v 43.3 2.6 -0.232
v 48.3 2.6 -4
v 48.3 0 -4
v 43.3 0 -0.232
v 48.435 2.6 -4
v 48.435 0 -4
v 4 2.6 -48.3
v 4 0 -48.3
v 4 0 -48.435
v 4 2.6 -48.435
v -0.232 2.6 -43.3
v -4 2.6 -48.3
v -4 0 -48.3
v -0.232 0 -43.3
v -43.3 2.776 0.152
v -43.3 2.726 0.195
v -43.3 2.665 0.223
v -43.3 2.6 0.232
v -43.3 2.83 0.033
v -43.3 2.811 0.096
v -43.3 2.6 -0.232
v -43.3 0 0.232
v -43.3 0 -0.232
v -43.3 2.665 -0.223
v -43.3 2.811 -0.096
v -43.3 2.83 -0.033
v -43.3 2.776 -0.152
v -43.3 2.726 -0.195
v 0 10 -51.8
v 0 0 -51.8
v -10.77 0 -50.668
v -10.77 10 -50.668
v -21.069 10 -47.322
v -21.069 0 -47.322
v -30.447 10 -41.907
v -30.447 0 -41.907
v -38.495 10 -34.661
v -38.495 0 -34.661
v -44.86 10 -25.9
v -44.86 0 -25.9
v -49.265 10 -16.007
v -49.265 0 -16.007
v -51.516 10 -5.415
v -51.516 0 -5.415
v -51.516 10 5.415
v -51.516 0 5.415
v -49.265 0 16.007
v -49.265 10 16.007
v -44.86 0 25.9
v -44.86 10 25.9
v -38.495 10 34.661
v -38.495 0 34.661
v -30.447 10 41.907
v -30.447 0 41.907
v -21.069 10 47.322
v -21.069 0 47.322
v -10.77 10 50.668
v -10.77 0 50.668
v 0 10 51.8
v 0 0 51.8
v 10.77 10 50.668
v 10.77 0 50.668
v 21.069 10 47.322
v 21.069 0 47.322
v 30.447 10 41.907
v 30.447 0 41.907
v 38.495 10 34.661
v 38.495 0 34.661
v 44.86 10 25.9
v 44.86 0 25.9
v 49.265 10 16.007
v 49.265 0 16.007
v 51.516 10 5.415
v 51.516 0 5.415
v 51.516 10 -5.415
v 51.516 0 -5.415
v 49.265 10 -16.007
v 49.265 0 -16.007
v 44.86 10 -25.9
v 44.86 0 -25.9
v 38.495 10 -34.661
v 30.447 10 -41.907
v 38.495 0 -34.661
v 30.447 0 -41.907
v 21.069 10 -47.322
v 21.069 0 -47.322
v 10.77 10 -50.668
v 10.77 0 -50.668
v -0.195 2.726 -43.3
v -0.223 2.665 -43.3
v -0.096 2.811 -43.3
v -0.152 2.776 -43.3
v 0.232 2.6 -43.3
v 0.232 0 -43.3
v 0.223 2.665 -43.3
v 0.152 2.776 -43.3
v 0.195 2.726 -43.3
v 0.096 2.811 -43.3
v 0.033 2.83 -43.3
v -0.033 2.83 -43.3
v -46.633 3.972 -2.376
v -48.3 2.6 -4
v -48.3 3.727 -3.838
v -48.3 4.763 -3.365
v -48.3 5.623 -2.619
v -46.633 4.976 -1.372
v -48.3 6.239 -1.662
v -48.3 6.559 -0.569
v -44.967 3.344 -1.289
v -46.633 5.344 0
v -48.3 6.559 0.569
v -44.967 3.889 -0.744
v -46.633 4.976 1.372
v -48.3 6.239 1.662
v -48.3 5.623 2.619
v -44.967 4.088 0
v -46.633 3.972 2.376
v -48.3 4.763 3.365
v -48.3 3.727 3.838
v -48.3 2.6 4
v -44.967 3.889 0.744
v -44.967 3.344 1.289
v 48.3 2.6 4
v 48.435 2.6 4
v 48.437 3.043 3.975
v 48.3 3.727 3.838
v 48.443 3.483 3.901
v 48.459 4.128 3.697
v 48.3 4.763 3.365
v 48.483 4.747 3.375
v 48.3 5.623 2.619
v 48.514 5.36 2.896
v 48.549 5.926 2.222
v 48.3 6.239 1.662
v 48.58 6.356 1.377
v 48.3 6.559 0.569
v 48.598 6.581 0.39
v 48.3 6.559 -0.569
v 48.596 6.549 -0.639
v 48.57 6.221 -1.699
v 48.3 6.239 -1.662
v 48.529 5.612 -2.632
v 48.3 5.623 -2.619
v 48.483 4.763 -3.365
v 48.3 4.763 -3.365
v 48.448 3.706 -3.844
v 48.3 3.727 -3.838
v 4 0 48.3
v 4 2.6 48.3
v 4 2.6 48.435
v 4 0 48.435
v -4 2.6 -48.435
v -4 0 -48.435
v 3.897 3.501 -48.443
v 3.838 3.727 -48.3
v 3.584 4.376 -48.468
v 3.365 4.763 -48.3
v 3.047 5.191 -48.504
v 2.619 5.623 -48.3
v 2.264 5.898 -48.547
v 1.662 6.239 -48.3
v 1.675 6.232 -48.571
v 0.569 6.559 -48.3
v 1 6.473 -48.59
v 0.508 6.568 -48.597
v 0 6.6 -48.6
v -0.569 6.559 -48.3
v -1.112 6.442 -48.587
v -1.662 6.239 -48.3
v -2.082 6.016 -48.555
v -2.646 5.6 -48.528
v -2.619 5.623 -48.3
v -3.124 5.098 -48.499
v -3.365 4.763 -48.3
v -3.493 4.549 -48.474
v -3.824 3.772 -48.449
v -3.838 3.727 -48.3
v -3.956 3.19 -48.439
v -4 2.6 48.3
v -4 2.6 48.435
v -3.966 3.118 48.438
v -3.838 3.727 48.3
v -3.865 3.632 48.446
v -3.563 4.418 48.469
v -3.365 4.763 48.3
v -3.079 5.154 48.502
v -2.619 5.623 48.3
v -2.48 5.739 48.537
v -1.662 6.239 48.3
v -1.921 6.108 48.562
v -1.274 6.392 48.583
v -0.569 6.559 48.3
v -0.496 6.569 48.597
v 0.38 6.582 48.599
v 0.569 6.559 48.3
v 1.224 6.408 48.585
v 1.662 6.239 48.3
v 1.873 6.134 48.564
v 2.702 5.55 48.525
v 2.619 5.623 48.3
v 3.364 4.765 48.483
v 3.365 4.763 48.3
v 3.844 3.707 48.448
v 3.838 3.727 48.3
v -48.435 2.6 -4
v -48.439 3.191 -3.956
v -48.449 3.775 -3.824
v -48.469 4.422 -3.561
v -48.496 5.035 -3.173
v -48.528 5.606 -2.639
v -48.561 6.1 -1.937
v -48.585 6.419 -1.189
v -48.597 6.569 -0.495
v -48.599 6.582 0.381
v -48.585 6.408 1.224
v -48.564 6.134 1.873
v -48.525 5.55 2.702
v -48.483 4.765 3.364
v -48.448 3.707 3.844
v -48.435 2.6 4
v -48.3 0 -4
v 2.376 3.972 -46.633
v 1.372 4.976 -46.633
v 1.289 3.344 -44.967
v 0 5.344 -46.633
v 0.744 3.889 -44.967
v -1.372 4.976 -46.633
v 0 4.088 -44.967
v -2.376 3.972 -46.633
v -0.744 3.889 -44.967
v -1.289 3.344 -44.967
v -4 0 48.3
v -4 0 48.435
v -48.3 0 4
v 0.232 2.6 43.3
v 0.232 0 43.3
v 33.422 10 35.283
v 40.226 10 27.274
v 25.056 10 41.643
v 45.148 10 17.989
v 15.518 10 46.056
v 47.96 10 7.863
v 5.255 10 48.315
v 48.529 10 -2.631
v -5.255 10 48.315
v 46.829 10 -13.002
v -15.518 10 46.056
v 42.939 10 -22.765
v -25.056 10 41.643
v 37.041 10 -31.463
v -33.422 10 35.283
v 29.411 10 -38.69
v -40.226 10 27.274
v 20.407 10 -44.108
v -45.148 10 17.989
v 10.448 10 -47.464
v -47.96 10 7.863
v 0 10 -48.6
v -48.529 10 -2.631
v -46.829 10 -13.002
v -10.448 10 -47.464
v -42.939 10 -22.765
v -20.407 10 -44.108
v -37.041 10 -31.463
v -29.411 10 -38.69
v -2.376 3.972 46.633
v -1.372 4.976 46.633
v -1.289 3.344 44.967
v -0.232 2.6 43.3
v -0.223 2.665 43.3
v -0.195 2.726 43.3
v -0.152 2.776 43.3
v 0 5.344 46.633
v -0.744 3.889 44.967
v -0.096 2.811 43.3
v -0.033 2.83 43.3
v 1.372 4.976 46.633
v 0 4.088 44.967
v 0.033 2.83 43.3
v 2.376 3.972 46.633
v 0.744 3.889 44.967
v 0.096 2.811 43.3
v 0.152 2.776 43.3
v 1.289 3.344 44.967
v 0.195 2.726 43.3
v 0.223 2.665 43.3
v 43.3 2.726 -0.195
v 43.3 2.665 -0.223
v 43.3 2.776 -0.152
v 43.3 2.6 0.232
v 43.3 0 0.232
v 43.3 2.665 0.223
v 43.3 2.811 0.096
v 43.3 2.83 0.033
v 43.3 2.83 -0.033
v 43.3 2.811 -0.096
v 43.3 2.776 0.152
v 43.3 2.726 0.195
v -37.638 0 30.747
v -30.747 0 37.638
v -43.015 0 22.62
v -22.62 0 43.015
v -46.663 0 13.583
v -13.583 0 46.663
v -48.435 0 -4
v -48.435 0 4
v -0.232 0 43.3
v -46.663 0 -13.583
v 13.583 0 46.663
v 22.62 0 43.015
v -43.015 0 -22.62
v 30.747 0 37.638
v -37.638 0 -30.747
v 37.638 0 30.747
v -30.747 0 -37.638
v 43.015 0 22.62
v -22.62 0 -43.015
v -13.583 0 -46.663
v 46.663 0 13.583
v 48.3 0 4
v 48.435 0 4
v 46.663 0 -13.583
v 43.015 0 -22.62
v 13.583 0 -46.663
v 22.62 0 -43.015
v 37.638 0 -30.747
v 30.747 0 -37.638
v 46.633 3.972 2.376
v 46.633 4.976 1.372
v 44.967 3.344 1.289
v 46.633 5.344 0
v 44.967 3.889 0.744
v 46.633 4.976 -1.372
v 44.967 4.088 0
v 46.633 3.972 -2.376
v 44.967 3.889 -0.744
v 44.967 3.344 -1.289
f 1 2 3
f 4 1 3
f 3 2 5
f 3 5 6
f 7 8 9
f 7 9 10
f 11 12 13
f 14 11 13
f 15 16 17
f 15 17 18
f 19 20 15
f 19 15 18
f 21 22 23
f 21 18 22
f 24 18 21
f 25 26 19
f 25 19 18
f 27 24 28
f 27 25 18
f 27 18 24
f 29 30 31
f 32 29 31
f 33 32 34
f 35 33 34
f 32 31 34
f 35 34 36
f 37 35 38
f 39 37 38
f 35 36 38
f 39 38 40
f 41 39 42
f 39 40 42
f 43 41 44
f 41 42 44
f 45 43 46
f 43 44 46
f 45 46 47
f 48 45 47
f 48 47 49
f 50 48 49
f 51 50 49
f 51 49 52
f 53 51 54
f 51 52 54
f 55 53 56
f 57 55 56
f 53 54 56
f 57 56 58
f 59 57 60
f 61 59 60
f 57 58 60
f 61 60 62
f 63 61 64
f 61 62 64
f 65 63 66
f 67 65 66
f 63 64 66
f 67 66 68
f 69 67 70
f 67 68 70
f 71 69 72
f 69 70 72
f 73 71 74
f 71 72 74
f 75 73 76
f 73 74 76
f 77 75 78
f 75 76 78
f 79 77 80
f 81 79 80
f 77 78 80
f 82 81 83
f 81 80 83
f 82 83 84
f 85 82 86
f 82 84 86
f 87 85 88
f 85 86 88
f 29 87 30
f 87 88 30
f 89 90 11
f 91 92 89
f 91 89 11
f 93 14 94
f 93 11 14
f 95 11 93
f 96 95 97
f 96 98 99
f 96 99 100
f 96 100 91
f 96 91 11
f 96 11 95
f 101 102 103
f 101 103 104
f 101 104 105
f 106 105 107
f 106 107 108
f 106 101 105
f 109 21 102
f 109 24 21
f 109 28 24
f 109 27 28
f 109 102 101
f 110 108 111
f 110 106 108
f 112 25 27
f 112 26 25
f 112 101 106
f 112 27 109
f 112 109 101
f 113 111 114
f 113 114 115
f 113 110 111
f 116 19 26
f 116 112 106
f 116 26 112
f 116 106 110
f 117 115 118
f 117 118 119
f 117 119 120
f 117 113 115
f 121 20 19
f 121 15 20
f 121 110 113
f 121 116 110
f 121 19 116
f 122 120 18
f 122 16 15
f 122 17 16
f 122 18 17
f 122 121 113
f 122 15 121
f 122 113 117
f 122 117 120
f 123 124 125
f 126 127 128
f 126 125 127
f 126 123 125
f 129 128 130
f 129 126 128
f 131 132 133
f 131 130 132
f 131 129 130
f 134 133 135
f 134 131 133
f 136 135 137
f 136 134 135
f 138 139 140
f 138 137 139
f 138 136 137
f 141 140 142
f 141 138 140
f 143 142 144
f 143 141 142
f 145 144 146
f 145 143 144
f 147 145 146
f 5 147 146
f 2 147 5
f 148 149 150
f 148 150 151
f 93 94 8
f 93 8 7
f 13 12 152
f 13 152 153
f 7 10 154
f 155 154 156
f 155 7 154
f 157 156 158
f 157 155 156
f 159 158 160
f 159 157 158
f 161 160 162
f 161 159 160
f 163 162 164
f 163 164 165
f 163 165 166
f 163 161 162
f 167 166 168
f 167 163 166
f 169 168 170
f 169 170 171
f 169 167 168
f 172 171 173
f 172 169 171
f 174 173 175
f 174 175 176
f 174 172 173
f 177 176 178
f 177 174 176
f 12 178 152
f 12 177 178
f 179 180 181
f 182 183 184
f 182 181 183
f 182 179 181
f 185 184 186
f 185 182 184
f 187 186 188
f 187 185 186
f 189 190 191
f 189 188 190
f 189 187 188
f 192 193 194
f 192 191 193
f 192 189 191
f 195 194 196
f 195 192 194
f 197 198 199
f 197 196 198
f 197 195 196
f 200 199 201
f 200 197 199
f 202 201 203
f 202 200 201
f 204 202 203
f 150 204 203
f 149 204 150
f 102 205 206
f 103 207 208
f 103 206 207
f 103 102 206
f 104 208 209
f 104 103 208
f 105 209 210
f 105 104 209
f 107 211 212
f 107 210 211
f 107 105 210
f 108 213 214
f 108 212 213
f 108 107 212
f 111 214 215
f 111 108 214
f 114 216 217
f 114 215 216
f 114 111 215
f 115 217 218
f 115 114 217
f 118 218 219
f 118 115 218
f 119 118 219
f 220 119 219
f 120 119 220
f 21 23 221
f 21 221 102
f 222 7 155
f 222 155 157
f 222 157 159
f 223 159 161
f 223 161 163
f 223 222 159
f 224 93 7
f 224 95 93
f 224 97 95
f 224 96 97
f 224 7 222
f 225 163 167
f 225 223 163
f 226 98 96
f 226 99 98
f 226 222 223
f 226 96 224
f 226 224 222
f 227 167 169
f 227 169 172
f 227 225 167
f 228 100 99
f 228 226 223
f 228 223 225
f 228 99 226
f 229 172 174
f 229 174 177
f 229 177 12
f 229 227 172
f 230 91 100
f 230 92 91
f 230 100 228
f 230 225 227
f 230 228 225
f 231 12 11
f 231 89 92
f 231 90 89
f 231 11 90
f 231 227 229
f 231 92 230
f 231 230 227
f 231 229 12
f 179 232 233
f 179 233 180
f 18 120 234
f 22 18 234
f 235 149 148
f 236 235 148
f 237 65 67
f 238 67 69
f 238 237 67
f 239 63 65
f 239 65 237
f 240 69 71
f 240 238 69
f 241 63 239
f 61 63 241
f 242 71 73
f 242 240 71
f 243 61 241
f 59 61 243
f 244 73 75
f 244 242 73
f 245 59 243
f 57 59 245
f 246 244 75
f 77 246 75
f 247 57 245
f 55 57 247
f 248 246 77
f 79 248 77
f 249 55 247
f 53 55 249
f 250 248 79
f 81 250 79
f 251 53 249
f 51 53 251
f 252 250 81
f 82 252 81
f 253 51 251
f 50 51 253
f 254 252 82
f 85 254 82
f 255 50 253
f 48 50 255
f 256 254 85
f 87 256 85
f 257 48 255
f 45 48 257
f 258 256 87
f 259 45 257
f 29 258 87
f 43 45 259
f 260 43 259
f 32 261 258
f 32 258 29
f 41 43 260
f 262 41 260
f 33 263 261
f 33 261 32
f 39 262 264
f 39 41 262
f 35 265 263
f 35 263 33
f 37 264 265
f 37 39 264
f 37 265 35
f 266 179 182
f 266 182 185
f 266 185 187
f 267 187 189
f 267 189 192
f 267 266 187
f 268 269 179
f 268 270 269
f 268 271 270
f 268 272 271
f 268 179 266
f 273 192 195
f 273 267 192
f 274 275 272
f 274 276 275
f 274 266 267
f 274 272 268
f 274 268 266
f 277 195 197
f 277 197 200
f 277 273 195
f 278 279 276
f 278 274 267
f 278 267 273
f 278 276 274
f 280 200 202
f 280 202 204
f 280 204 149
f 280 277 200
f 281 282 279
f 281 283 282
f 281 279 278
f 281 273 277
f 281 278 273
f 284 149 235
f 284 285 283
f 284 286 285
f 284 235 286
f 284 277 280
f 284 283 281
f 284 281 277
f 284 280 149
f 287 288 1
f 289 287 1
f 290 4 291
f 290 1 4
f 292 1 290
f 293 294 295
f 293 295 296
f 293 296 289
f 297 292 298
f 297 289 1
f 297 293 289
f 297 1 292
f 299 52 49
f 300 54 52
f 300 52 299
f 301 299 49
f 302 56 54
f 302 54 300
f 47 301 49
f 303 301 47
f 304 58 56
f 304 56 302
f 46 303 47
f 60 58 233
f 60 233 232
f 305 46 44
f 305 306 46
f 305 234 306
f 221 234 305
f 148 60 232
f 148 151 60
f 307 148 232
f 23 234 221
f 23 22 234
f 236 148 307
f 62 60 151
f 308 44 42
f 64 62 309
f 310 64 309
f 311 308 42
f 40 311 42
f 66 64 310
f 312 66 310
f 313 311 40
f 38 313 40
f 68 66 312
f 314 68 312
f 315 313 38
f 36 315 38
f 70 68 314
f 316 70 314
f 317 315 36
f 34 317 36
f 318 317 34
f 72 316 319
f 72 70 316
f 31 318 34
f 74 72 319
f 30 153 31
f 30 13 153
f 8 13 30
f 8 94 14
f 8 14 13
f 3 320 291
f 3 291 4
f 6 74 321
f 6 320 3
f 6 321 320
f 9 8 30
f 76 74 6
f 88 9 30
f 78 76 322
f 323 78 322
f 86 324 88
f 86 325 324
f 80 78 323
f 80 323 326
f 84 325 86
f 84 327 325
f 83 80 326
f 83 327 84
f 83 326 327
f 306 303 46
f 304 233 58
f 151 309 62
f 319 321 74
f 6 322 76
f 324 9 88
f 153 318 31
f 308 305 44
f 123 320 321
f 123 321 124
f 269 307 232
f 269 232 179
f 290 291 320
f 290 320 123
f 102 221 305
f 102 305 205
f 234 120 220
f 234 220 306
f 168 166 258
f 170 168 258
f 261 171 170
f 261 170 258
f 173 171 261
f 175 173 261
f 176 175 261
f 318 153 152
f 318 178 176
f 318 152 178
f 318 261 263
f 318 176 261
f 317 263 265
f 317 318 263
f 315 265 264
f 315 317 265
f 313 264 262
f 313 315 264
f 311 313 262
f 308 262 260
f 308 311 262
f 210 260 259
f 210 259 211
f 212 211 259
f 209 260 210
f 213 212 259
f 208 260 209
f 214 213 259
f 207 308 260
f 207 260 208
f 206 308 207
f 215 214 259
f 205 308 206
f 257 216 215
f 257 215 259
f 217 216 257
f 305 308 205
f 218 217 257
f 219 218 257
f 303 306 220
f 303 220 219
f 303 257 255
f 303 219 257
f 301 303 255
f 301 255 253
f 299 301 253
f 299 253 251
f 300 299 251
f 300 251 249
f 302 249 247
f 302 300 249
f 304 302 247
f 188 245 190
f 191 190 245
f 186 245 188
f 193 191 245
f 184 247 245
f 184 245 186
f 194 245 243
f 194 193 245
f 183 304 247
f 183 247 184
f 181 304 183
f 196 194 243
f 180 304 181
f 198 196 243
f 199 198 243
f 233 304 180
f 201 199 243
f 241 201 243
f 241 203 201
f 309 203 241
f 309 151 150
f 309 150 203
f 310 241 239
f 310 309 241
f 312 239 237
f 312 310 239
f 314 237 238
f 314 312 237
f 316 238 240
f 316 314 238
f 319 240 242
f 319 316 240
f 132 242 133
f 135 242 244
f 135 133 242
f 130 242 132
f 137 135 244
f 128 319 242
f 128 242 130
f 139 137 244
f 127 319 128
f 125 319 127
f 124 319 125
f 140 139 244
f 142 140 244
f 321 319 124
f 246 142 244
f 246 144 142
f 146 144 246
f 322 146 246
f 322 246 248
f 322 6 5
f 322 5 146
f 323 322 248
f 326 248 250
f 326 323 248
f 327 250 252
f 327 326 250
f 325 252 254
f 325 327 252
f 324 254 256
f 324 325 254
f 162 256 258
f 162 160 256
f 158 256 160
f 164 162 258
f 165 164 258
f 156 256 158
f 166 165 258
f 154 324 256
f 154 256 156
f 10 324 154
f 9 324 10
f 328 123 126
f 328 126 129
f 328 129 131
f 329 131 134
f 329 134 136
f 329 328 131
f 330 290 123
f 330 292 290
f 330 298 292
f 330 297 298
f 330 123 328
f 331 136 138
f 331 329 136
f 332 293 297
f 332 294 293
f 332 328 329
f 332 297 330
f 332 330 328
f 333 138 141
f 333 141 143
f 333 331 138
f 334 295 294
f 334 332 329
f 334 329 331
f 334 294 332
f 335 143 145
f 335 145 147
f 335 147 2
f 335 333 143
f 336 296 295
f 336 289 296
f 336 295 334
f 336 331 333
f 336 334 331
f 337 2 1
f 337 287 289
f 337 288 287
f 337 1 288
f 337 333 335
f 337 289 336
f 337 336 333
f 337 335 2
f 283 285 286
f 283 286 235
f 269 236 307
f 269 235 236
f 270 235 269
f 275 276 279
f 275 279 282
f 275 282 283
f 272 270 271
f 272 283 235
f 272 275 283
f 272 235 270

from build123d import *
from OCP.BRepFilletAPI import BRepFilletAPI_MakeChamfer

# Parameters (mm, degrees)
SKETCH_1_R                            = 51.8
SKETCH_1_R_2                          = 48.6
EXTRUDE_1_DEPTH                       = 10
EXTRUDE_START                         = 43.299942
EXTRUDE_4_DEPTH                       = 5.300058
CHAMFER_1_SIZE                        = 5
CHAMFER_1_SIZE2                       = 3.767770251
PATTERN_CIRCULAR_4_COUNT              = 4
CHAMFER_1_OF_PATTERN_CIRCULAR_4_SIZE  = 5
CHAMFER_1_OF_PATTERN_CIRCULAR_4_SIZE2 = 3.767770251


with BuildPart() as part:
    # 草图1 → 凸台-拉伸1 (new body)
    with BuildSketch(Plane(origin=(0, 0, 0), x_dir=(1, 0, 0), z_dir=(0, 1, 0))):
        with Locations(Location((0, 0, 0), (0, 0, 90))):
            Circle(SKETCH_1_R)
        with Locations(Location((0, 0, 0), (0, 0, 90))):
            Circle(SKETCH_1_R_2, mode=Mode.SUBTRACT)
    extrude(amount=EXTRUDE_1_DEPTH)

    # 草图2 → 凸台-拉伸4 (add)
    with BuildSketch(Plane.XY.offset(EXTRUDE_START)):
        with BuildLine():
            Line((4, 2.6), (4, 0))
            Line((4, 0), (-4, 0))
            Line((-4, 0), (-4, 2.6))
            ThreePointArc((-4, 2.6), (0, 6.6), (4, 2.6))
        make_face()
    extrude_4 = extrude(amount=EXTRUDE_4_DEPTH)

    # 倒角1: one chamfer whose edges measure the first distance from different faces: ONE call of the kernel's chamfer builder (chamfer() names one face for all edges)
    chamfer_1_edges_1 = [part.edges().sort_by_distance(p)[0] for p in [
        (0, 6.6, 43.299942),
    ]]
    chamfer_1_side_1 = [part.faces().sort_by_distance(p)[0] for p in [
        (0, 6.6, 45.95017715),
    ]]
    chamfer_1_edges_2 = [part.edges().sort_by_distance(p)[0] for p in [
        (4, 1.3, 43.299942),
    ]]
    chamfer_1_side_2 = [part.faces().sort_by_distance(p)[0] for p in [
        (4, 1.3, 45.867526616),
    ]]
    chamfer_1 = BRepFilletAPI_MakeChamfer(part.part.solid().wrapped)
    for e in chamfer_1_edges_1:
        chamfer_1.Add(CHAMFER_1_SIZE, CHAMFER_1_SIZE2, e.wrapped, chamfer_1_side_1[0].wrapped)  # the first distance lies on this face
    for e in chamfer_1_edges_2:
        chamfer_1.Add(CHAMFER_1_SIZE, CHAMFER_1_SIZE2, e.wrapped, chamfer_1_side_2[0].wrapped)  # the first distance lies on this face
    add(Compound.cast(chamfer_1.Shape()), mode=Mode.REPLACE)

    # 阵列(圆周)4: 凸台-拉伸4 ×4 about axis
    pattern_circular_4_axis = Axis((0, 0, 0), (0, 1, 0))
    for i in range(1, PATTERN_CIRCULAR_4_COUNT):
        add(extrude_4.rotate(pattern_circular_4_axis, i * 360 / PATTERN_CIRCULAR_4_COUNT))

    # 倒角1 of 阵列(圆周)4: one chamfer whose edges measure the first distance from different faces: ONE call of the kernel's chamfer builder (chamfer() names one face for all edges)
    chamfer_1_of_pattern_circular_4_edges_1 = [part.edges().sort_by_distance(p)[0] for p in [
        (43.299942, 6.6, 0),
    ]]
    chamfer_1_of_pattern_circular_4_side_1 = [part.faces().sort_by_distance(p)[0] for p in [
        (45.95017715, 6.6, 0),
    ]]
    chamfer_1_of_pattern_circular_4_edges_2 = [part.edges().sort_by_distance(p)[0] for p in [
        (43.299942, 1.3, -4),
    ]]
    chamfer_1_of_pattern_circular_4_side_2 = [part.faces().sort_by_distance(p)[0] for p in [
        (45.867526616, 1.3, -4),
    ]]
    chamfer_1_of_pattern_circular_4_edges_3 = [part.edges().sort_by_distance(p)[0] for p in [
        (0, 6.6, -43.299942),
    ]]
    chamfer_1_of_pattern_circular_4_side_3 = [part.faces().sort_by_distance(p)[0] for p in [
        (0, 6.6, -45.95017715),
    ]]
    chamfer_1_of_pattern_circular_4_edges_4 = [part.edges().sort_by_distance(p)[0] for p in [
        (-4, 1.3, -43.299942),
    ]]
    chamfer_1_of_pattern_circular_4_side_4 = [part.faces().sort_by_distance(p)[0] for p in [
        (-4, 1.3, -45.867526616),
    ]]
    chamfer_1_of_pattern_circular_4_edges_5 = [part.edges().sort_by_distance(p)[0] for p in [
        (-43.299942, 6.6, 0),
    ]]
    chamfer_1_of_pattern_circular_4_side_5 = [part.faces().sort_by_distance(p)[0] for p in [
        (-45.95017715, 6.6, 0),
    ]]
    chamfer_1_of_pattern_circular_4_edges_6 = [part.edges().sort_by_distance(p)[0] for p in [
        (-43.299942, 1.3, 4),
    ]]
    chamfer_1_of_pattern_circular_4_side_6 = [part.faces().sort_by_distance(p)[0] for p in [
        (-45.867526616, 1.3, 4),
    ]]
    chamfer_1_of_pattern_circular_4 = BRepFilletAPI_MakeChamfer(part.part.solid().wrapped)
    for e in chamfer_1_of_pattern_circular_4_edges_1:
        chamfer_1_of_pattern_circular_4.Add(CHAMFER_1_OF_PATTERN_CIRCULAR_4_SIZE, CHAMFER_1_OF_PATTERN_CIRCULAR_4_SIZE2, e.wrapped, chamfer_1_of_pattern_circular_4_side_1[0].wrapped)  # the first distance lies on this face
    for e in chamfer_1_of_pattern_circular_4_edges_2:
        chamfer_1_of_pattern_circular_4.Add(CHAMFER_1_OF_PATTERN_CIRCULAR_4_SIZE, CHAMFER_1_OF_PATTERN_CIRCULAR_4_SIZE2, e.wrapped, chamfer_1_of_pattern_circular_4_side_2[0].wrapped)  # the first distance lies on this face
    for e in chamfer_1_of_pattern_circular_4_edges_3:
        chamfer_1_of_pattern_circular_4.Add(CHAMFER_1_OF_PATTERN_CIRCULAR_4_SIZE, CHAMFER_1_OF_PATTERN_CIRCULAR_4_SIZE2, e.wrapped, chamfer_1_of_pattern_circular_4_side_3[0].wrapped)  # the first distance lies on this face
    for e in chamfer_1_of_pattern_circular_4_edges_4:
        chamfer_1_of_pattern_circular_4.Add(CHAMFER_1_OF_PATTERN_CIRCULAR_4_SIZE, CHAMFER_1_OF_PATTERN_CIRCULAR_4_SIZE2, e.wrapped, chamfer_1_of_pattern_circular_4_side_4[0].wrapped)  # the first distance lies on this face
    for e in chamfer_1_of_pattern_circular_4_edges_5:
        chamfer_1_of_pattern_circular_4.Add(CHAMFER_1_OF_PATTERN_CIRCULAR_4_SIZE, CHAMFER_1_OF_PATTERN_CIRCULAR_4_SIZE2, e.wrapped, chamfer_1_of_pattern_circular_4_side_5[0].wrapped)  # the first distance lies on this face
    for e in chamfer_1_of_pattern_circular_4_edges_6:
        chamfer_1_of_pattern_circular_4.Add(CHAMFER_1_OF_PATTERN_CIRCULAR_4_SIZE, CHAMFER_1_OF_PATTERN_CIRCULAR_4_SIZE2, e.wrapped, chamfer_1_of_pattern_circular_4_side_6[0].wrapped)  # the first distance lies on this face
    add(Compound.cast(chamfer_1_of_pattern_circular_4.Shape()), mode=Mode.REPLACE)


solid = part.part
